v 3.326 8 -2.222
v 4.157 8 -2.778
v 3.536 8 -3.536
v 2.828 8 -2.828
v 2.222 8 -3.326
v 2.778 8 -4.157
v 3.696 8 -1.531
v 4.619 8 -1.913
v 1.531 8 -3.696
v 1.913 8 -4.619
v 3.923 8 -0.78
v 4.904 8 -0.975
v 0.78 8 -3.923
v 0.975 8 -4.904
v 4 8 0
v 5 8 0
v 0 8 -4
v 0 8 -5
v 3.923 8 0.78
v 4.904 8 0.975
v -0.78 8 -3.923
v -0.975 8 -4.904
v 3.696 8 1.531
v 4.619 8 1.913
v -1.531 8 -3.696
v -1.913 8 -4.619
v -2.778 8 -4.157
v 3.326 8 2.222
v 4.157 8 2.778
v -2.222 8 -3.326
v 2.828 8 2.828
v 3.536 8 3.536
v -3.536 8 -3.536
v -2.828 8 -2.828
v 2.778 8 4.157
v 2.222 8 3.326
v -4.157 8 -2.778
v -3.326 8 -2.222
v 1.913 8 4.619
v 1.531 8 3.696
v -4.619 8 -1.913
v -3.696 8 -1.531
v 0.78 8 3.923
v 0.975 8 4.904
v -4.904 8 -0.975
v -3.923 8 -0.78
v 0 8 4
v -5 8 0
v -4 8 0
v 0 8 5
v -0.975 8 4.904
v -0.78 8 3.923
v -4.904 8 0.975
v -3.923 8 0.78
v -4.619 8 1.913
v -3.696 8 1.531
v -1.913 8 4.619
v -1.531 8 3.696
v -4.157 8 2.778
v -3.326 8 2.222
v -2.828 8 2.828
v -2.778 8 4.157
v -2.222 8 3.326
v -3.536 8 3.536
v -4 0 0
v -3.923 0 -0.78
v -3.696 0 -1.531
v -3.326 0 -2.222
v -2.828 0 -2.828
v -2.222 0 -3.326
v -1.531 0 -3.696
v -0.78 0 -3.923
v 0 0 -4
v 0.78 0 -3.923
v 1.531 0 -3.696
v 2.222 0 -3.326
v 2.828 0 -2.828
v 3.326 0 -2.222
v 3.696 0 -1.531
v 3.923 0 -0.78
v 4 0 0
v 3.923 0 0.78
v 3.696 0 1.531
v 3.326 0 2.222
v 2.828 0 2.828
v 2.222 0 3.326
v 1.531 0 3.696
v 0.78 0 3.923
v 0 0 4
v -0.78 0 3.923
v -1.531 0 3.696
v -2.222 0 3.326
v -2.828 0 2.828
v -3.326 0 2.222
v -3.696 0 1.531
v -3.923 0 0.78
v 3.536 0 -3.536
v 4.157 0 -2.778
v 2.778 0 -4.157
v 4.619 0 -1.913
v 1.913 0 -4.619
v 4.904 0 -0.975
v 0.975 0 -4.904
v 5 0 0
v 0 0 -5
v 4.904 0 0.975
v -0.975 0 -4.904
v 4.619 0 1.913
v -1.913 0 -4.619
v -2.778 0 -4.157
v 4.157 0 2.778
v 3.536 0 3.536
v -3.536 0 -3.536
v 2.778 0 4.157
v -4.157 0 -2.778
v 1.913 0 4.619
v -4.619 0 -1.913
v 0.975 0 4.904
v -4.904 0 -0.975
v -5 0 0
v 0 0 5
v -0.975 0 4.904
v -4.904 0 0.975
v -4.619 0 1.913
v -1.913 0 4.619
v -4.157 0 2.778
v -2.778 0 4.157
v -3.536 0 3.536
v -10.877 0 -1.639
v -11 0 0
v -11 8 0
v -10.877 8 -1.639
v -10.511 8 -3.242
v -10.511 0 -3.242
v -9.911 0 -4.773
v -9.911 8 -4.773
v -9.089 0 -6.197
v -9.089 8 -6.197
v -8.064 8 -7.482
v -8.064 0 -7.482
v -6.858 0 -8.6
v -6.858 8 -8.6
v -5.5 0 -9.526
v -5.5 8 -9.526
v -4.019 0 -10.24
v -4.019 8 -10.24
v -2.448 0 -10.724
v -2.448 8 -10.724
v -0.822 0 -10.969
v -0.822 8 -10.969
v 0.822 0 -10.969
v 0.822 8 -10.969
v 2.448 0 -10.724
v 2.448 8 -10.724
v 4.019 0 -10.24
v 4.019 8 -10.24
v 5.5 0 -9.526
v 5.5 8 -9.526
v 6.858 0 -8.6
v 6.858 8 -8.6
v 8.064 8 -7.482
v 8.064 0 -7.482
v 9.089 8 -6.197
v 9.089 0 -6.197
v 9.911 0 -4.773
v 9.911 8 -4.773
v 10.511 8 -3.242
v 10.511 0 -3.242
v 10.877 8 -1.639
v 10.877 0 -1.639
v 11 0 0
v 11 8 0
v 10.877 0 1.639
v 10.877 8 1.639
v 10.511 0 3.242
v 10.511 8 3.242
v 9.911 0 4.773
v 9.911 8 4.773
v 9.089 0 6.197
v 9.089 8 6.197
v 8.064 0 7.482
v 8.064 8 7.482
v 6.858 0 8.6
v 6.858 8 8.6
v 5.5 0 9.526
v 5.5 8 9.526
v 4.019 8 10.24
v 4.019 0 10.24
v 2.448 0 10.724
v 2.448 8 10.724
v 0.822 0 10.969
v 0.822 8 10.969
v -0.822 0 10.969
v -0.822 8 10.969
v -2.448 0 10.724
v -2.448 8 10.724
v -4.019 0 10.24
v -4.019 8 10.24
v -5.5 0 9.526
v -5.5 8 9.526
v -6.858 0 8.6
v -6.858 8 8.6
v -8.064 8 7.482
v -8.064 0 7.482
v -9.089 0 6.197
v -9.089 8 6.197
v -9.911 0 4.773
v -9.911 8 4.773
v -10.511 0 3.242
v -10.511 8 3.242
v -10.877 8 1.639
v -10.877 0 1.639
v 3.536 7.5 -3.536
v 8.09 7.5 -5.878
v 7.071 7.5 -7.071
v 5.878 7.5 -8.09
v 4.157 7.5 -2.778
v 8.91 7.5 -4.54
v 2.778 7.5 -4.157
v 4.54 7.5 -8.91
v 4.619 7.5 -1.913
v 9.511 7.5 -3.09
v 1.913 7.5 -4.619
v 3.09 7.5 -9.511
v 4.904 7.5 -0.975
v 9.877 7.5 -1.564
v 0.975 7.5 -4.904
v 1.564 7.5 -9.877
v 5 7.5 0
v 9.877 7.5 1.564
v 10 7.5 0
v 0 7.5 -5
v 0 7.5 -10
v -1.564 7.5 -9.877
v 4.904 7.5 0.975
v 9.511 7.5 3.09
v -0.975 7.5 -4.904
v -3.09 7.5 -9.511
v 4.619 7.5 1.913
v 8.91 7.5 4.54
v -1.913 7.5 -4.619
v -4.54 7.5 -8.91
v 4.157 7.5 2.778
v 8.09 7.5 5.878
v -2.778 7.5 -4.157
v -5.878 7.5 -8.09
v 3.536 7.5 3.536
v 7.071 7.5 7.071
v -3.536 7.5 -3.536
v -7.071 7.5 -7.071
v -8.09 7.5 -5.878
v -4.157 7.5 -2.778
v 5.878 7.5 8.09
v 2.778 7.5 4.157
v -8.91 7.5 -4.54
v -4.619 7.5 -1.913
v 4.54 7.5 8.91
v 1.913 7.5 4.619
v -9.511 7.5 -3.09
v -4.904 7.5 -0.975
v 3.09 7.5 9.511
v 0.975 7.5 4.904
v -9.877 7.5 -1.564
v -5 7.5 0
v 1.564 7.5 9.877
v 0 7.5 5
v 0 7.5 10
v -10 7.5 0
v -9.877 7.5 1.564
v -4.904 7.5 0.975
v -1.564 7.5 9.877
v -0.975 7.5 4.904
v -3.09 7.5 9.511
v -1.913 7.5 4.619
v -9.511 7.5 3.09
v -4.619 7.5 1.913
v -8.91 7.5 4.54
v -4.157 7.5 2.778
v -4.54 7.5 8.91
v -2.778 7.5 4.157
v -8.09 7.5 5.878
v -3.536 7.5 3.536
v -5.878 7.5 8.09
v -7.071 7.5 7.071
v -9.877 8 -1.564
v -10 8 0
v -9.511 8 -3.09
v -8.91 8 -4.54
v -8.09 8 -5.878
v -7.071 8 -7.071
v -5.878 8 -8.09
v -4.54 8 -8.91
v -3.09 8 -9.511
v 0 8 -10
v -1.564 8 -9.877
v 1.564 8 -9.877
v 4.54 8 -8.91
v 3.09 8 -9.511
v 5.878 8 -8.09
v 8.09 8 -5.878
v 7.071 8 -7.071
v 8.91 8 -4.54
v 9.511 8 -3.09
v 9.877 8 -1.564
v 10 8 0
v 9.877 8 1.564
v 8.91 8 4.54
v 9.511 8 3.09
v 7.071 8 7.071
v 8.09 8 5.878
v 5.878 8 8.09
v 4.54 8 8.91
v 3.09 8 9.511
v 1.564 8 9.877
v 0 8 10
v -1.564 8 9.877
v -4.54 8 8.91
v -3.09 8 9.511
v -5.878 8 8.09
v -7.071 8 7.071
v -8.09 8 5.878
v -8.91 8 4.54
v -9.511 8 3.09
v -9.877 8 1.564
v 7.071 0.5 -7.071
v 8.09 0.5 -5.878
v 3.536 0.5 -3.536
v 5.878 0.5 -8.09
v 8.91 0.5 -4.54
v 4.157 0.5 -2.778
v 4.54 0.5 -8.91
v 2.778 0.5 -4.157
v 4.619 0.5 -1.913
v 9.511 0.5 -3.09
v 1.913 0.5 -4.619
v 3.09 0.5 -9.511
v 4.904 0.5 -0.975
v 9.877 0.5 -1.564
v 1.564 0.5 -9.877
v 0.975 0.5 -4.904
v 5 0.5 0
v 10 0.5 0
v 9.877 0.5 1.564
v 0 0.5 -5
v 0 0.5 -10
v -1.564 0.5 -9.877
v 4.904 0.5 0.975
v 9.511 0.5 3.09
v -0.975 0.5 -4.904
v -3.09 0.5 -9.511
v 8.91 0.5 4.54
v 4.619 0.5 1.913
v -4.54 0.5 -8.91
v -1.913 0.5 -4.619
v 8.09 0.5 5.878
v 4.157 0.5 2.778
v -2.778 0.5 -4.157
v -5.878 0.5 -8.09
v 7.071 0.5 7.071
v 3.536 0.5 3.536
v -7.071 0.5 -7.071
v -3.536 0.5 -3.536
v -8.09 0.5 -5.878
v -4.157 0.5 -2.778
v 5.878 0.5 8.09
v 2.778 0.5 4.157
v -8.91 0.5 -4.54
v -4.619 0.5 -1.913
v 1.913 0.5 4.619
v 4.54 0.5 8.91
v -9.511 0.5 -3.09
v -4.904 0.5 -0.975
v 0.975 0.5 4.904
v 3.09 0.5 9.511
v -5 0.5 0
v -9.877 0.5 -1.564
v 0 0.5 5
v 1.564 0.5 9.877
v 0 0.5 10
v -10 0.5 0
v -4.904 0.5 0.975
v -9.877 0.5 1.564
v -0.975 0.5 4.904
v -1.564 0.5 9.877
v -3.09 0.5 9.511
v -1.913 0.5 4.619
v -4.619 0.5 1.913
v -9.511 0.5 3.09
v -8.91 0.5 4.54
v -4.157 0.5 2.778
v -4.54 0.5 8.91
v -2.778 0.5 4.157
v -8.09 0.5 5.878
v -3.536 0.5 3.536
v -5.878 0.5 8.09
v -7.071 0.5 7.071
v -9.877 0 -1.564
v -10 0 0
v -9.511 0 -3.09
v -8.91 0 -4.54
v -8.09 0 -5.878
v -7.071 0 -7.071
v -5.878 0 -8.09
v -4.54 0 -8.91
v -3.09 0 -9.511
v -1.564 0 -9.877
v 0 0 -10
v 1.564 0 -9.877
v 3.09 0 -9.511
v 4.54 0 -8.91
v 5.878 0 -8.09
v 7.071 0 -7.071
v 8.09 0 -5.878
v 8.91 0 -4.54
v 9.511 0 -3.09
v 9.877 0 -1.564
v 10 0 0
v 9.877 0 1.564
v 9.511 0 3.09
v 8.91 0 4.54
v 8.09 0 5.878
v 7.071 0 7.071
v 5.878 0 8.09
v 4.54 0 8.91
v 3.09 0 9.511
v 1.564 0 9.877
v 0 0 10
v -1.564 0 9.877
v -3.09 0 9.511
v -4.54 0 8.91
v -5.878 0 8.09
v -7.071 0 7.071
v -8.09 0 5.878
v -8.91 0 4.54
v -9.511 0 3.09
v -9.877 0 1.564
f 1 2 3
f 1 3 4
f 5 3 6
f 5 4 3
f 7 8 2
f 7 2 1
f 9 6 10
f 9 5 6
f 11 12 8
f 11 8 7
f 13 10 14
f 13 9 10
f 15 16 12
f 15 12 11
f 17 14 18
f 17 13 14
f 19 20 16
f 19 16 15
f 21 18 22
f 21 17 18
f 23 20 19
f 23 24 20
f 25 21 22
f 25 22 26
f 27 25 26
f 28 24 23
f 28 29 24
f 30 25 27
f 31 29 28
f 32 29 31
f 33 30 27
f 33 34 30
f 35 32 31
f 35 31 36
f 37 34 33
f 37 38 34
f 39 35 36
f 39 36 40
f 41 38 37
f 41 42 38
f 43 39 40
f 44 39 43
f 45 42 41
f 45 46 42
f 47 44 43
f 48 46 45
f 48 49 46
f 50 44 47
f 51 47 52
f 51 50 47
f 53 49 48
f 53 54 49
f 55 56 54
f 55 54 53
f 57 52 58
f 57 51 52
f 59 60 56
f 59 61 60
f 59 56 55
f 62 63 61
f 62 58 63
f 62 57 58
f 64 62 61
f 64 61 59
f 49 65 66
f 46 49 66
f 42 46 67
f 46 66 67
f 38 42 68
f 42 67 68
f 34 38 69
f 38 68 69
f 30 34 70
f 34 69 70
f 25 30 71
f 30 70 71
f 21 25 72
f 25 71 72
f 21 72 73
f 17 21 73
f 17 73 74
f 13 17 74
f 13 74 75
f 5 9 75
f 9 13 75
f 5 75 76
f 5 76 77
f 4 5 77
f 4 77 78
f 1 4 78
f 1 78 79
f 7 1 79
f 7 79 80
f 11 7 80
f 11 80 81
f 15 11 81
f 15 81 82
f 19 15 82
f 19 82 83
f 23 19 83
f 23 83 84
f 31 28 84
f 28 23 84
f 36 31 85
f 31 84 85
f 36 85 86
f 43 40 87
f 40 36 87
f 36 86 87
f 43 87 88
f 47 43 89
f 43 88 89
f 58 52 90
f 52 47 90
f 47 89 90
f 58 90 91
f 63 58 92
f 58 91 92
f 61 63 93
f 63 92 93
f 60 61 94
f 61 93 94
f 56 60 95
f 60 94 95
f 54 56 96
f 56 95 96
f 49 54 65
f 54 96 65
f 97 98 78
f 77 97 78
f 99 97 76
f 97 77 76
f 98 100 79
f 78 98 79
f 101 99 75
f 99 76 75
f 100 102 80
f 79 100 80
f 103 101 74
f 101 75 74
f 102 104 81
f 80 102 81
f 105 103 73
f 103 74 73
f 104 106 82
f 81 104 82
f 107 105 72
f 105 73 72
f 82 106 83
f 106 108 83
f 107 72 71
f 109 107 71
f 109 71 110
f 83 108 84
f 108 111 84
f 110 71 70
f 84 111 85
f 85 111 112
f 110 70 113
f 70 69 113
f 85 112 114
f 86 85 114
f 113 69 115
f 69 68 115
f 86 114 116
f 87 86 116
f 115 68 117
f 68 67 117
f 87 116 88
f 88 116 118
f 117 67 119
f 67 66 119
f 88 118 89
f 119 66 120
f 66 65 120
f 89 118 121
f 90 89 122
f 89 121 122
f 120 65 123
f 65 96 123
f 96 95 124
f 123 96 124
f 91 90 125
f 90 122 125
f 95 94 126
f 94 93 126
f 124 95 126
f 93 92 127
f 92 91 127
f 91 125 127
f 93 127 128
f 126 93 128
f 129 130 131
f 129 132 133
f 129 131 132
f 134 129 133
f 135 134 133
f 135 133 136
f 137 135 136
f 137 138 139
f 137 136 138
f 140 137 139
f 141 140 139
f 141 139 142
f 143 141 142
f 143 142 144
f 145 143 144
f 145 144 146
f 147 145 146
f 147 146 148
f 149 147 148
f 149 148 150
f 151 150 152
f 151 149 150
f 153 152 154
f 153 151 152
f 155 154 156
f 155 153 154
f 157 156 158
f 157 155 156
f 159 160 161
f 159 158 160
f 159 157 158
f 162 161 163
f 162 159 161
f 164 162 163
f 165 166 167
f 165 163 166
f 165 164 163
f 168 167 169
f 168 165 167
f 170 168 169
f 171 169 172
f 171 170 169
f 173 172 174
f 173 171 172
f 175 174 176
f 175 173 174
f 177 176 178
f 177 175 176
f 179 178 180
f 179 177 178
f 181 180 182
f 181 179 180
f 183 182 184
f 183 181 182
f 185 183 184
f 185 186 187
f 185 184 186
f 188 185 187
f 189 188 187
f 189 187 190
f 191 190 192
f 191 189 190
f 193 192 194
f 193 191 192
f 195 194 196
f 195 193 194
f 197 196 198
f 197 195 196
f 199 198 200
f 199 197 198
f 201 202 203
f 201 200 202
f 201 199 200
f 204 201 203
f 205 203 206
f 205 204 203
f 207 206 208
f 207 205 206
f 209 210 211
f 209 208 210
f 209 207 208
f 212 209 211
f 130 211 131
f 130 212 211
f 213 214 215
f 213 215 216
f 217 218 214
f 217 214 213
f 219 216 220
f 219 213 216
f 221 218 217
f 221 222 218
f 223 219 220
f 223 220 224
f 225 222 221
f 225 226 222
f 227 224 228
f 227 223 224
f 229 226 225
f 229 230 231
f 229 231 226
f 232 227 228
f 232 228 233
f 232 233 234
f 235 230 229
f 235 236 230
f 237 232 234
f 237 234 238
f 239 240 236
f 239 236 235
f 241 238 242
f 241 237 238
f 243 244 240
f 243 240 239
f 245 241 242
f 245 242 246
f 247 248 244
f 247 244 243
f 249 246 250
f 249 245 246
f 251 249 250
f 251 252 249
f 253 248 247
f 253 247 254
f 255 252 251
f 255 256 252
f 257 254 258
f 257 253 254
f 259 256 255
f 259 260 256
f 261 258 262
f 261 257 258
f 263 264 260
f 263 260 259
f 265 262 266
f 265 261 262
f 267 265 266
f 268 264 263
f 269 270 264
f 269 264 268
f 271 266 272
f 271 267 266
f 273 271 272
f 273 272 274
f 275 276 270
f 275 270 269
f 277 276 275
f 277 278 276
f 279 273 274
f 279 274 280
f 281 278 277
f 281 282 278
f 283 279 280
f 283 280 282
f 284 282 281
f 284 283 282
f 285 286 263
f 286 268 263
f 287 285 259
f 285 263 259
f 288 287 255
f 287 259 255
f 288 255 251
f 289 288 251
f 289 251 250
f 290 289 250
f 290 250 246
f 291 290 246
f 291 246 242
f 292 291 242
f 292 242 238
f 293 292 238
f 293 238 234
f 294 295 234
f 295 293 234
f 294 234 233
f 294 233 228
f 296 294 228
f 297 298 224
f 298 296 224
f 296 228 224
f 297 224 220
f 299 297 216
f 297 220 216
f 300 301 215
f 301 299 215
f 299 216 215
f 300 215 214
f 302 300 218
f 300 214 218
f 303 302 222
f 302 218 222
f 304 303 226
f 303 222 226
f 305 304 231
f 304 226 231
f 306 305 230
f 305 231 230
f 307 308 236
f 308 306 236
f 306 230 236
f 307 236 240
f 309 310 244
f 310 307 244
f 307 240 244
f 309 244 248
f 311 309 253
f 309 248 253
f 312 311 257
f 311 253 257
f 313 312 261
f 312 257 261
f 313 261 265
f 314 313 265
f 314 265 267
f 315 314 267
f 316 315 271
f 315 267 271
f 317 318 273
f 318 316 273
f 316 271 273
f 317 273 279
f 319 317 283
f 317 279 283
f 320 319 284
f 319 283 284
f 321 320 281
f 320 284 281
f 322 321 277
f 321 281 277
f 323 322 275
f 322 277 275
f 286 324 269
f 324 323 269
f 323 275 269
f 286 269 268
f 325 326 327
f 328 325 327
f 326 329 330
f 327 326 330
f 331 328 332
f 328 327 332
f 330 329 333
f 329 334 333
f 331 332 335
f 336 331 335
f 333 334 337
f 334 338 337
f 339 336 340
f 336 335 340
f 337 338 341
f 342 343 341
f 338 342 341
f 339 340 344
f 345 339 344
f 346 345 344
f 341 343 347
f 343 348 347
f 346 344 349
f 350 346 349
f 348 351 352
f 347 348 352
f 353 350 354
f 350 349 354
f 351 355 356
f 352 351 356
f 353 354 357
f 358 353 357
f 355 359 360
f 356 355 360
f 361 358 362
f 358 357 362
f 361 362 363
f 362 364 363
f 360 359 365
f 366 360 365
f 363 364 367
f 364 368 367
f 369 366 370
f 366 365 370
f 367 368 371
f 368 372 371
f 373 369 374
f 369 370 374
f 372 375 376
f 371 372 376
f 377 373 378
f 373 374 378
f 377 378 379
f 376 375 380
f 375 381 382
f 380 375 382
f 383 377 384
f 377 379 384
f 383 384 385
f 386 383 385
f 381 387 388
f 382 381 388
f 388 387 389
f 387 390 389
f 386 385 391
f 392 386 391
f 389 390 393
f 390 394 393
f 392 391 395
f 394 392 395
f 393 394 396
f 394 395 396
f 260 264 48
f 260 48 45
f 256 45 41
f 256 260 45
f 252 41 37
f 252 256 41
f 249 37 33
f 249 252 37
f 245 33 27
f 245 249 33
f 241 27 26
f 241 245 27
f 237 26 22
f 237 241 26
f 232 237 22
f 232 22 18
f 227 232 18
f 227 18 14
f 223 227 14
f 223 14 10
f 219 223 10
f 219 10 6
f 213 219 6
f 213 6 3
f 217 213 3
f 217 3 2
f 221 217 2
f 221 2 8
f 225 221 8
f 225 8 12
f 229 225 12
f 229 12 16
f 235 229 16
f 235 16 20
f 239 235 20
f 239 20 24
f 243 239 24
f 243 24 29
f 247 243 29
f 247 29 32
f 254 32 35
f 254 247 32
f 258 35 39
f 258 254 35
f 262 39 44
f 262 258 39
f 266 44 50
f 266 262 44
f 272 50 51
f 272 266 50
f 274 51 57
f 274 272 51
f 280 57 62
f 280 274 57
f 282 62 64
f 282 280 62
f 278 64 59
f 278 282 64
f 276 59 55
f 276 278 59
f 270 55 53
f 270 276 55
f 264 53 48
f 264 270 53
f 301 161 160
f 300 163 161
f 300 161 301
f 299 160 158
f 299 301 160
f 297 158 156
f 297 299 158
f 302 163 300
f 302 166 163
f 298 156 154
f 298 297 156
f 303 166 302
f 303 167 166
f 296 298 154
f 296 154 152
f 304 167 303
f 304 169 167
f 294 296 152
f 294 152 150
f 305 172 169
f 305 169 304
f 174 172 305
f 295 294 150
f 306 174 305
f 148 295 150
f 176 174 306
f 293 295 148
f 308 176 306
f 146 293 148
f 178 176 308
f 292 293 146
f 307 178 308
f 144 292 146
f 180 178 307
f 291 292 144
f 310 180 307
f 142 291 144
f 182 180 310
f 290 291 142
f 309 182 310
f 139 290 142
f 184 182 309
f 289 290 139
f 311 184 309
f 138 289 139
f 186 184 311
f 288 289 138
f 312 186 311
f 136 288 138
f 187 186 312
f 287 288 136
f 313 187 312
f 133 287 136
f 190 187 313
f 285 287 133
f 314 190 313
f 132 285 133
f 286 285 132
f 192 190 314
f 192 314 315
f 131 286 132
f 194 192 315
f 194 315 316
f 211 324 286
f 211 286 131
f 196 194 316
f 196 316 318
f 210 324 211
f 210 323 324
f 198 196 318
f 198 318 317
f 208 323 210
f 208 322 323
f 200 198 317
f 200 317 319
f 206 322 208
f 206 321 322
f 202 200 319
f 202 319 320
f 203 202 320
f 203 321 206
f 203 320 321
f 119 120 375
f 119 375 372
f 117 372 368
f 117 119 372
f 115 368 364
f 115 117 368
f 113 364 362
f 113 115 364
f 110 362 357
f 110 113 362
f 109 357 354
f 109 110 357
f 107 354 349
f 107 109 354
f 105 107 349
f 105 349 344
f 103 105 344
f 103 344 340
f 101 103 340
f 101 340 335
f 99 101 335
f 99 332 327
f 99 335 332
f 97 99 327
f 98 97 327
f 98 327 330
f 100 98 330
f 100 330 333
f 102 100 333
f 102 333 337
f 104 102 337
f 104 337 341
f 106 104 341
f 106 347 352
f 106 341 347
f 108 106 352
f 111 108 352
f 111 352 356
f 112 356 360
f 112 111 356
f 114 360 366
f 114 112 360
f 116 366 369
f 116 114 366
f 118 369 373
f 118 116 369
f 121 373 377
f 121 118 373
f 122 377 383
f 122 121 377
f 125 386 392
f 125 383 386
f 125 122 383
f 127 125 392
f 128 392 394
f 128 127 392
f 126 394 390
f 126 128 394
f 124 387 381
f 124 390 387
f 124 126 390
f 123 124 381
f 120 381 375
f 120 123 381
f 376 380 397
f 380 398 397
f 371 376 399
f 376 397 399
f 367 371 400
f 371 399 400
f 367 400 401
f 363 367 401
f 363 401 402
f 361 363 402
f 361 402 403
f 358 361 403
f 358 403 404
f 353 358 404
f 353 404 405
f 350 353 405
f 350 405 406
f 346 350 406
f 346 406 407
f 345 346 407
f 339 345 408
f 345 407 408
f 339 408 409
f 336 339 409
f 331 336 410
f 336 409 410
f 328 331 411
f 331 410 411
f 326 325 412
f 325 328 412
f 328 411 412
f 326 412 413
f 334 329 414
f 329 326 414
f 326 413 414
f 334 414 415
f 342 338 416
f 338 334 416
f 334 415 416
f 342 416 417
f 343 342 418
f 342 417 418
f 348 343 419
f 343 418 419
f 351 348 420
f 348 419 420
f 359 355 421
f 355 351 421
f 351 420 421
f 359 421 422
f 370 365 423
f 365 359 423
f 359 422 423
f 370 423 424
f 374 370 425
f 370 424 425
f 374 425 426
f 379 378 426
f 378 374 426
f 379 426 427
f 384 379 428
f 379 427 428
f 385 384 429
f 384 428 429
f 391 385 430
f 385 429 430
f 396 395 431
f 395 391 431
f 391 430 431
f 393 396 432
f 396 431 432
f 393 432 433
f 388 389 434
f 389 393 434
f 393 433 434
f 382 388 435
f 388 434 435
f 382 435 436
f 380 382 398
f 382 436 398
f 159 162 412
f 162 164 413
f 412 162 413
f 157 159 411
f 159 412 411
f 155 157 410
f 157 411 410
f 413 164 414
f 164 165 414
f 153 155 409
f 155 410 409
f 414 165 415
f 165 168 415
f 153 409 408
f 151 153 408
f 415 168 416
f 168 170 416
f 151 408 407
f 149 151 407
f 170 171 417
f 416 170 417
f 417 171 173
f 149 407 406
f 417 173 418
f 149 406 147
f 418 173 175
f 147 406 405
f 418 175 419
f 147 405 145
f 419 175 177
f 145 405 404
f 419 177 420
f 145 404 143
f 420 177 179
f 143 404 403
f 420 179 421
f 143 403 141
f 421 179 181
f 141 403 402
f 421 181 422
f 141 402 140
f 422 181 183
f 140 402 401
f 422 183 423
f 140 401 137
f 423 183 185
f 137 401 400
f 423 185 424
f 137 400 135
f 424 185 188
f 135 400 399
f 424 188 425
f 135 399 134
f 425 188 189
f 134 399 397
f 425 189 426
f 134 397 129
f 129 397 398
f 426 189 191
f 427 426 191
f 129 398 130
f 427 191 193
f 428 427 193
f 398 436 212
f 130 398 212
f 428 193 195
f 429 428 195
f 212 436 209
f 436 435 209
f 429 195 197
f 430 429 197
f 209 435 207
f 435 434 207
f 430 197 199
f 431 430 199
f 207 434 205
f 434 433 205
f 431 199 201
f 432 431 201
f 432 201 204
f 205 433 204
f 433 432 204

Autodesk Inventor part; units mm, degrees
ref_plane "YZ Plane" through (0, 0, 0) normal (1, 0, 0) x (0, 1, 0)
ref_plane "XZ Plane" through (0, 0, 0) normal (0, 1, 0) x (-1, 0, 0)
ref_plane "XY Plane" through (0, 0, 0) normal (0, 0, 1) x (1, 0, 0)
sketch "Sketch1" plane through (0, 0, 0) normal (0, 1, 0) x (-1, 0, 0)
  circle A0 centre (0, 0) radius 4
  circle A1 centre (0, 0) radius 5
  circle A2 centre (0, 0) radius 11
  circle A3 centre (0, 0) radius 10
  dimension "d0" = 8
  dimension "d1" = 10
  dimension "d2" = 22
  dimension "d3" = 20
extrude "Extrusion1" add sketch "Sketch1" along normal blind 7.5 contours A3
extrude "Extrusion2" add sketch "Sketch1" along normal blind 8 contours A2
extrude "Extrusion3" cut sketch "Sketch1" along normal blind 0.5 contours A3
extrude "Extrusion4" add sketch "Sketch1" along normal blind 8 contours A1
properties part number "bearing"
